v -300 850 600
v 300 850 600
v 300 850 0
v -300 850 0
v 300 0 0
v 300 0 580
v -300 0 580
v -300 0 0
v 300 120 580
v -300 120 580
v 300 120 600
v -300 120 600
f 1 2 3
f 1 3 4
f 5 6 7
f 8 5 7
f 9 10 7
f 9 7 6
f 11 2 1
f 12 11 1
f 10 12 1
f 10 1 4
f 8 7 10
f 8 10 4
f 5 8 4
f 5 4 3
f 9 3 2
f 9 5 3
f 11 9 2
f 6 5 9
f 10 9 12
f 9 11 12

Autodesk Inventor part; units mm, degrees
ref_plane "YZ Plane" through (0, 0, 0) normal (1, 0, 0) x (0, 1, 0)
ref_plane "XZ Plane" through (0, 0, 0) normal (0, 1, 0) x (-1, 0, 0)
ref_plane "XY Plane" through (0, 0, 0) normal (0, 0, 1) x (1, 0, 0)
sketch "Sketch1" plane through (0, 0, 0) normal (0, 1, 0) x (-1, 0, 0)
  line L0 (300, 0) -> (-300, 0)
  line L1 (-300, 0) -> (-300, 600)
  line L2 (-300, 600) -> (300, 600)
  line L3 (300, 600) -> (300, 0)
  point P0 (0, 0)
  point P1 (0, 0)
  dimension "d0" = 600
  dimension "d1" = 600
extrude "Extrusion1" add sketch "Sketch1" along normal blind 850
sketch "Sketch3" plane through (-300, 0, 600) normal (0, 0, 1) x (1, 0, 0)
  line L0 (0, 0) -> (600, 0) projected
  line L1 (600, 0) -> (600, 850) projected
  line L2 (0, 0) -> (600, 0)
  line L3 (600, 0) -> (600, 120)
  line L4 (600, 120) -> (0, 120)
  line L5 (0, 120) -> (0, 0)
  point P0 (300, 0)
  dimension "d9" = 120
extrude "Extrusion3" cut sketch "Sketch3" against normal blind 20
properties part number "Mobile lavastoviglie"
